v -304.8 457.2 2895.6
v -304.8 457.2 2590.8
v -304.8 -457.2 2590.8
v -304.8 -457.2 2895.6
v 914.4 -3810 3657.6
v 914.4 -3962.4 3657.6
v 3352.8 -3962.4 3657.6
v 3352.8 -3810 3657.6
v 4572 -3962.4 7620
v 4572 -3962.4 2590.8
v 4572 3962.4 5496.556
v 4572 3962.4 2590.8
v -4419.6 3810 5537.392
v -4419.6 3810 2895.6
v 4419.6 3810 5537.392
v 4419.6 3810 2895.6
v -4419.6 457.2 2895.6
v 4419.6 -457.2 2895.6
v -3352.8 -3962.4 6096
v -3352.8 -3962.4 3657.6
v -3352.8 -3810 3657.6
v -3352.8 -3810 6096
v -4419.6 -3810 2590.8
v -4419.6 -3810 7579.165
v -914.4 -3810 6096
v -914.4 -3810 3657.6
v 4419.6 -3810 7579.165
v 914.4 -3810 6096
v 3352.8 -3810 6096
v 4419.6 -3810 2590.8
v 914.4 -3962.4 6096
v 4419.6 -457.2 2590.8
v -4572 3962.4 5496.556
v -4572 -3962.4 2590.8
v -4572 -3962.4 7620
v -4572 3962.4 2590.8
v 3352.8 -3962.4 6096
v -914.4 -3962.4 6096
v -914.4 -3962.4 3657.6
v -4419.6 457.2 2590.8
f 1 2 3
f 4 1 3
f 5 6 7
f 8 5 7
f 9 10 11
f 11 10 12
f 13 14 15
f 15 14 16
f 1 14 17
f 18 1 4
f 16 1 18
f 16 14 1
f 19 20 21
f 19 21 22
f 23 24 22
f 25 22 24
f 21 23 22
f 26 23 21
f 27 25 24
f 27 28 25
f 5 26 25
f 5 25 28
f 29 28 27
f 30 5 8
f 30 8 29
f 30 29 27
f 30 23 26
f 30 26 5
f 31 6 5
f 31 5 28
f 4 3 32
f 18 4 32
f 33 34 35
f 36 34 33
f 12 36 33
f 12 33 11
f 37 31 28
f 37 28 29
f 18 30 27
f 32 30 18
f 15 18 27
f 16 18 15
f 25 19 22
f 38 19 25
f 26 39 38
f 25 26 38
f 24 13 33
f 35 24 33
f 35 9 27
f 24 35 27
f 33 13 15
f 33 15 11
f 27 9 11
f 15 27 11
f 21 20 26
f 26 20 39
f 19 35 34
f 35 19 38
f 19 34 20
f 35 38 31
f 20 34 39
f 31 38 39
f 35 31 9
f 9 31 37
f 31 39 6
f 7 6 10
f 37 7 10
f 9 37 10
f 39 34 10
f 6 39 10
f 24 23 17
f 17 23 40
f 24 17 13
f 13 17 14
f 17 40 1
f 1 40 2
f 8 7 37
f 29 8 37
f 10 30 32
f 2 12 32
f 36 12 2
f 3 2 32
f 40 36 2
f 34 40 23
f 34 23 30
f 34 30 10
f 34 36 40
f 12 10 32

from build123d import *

# Parameters (mm, degrees)
F0_W      = 9144
F0_H      = 7924.8
F1_DEPTH  = 7620
F3_DEPTH  = 9144.001
F4_T      = -152.4
F5_W      = 914.4
F5_H      = 2133.6
F5_W_2    = 2438.4
F5_H_2    = 2438.4
F5_W_3    = 1828.8
F5_H_3    = 1524
F6_DEPTH  = 152.4
F9_DEPTH  = 304.8
F10_W     = 7924.8
F10_H     = 2590.8
F11_DEPTH = 9144.001


with BuildPart() as f1:
    # F0 (on Top) → F1 (new body)
    with BuildSketch(Plane.XY):
        Rectangle(F0_W, F0_H)
    extrude(amount=F1_DEPTH)

    # F2 (on face) → F3 (cut, through all)
    with BuildSketch(Plane.YZ.offset(4572)):
        Polygon((3962.4, 7620), (-3962.4, 7620), (3962.4, 5496.5562398218), align=None)
    extrude(amount=-F3_DEPTH, mode=Mode.SUBTRACT)

    # F4
    f4_openings = [f1.faces().sort_by_distance(p)[0] for p in [
        (0, 0, 6558.27812),
    ]]
    offset(amount=F4_T, openings=f4_openings)

    # F5 (on face) → F6 (cut, through all)
    with BuildSketch(Plane.XZ.offset(3962.4)):
        with Locations((0, 1219.2)):
            Rectangle(F5_W, F5_H)
        with Locations((-2133.6, 4876.8)):
            Rectangle(F5_W_2, F5_H_2)
        with Locations((2133.6, 4876.8)):
            Rectangle(F5_W_2, F5_H_2)
        with Locations((-2438.4, 1676.4)):
            Rectangle(F5_W_3, F5_H_3)
        with Locations((2438.4, 1676.4)):
            Rectangle(F5_W_3, F5_H_3)
    extrude(amount=-F6_DEPTH, mode=Mode.SUBTRACT)

    # F8 (on offset) → F9 (join)
    with BuildSketch(Plane.XY.offset(2590.8)):
        Polygon((4419.6, 3810), (-4419.6, 3810), (-4419.6, 457.2), (-304.8, 457.2), (-304.8, -457.2), (4419.6, -457.2), align=None)
    extrude(amount=F9_DEPTH)

    # F10 (on face) → F11 (cut, through all)
    with BuildSketch(Plane(origin=(-4572, 0, 0), x_dir=(0, -1, 0), z_dir=(-1, 0, 0))):
        with Locations((0, 1295.4)):
            Rectangle(F10_W, F10_H)
    extrude(amount=-F11_DEPTH, mode=Mode.SUBTRACT)


solid = f1.part
